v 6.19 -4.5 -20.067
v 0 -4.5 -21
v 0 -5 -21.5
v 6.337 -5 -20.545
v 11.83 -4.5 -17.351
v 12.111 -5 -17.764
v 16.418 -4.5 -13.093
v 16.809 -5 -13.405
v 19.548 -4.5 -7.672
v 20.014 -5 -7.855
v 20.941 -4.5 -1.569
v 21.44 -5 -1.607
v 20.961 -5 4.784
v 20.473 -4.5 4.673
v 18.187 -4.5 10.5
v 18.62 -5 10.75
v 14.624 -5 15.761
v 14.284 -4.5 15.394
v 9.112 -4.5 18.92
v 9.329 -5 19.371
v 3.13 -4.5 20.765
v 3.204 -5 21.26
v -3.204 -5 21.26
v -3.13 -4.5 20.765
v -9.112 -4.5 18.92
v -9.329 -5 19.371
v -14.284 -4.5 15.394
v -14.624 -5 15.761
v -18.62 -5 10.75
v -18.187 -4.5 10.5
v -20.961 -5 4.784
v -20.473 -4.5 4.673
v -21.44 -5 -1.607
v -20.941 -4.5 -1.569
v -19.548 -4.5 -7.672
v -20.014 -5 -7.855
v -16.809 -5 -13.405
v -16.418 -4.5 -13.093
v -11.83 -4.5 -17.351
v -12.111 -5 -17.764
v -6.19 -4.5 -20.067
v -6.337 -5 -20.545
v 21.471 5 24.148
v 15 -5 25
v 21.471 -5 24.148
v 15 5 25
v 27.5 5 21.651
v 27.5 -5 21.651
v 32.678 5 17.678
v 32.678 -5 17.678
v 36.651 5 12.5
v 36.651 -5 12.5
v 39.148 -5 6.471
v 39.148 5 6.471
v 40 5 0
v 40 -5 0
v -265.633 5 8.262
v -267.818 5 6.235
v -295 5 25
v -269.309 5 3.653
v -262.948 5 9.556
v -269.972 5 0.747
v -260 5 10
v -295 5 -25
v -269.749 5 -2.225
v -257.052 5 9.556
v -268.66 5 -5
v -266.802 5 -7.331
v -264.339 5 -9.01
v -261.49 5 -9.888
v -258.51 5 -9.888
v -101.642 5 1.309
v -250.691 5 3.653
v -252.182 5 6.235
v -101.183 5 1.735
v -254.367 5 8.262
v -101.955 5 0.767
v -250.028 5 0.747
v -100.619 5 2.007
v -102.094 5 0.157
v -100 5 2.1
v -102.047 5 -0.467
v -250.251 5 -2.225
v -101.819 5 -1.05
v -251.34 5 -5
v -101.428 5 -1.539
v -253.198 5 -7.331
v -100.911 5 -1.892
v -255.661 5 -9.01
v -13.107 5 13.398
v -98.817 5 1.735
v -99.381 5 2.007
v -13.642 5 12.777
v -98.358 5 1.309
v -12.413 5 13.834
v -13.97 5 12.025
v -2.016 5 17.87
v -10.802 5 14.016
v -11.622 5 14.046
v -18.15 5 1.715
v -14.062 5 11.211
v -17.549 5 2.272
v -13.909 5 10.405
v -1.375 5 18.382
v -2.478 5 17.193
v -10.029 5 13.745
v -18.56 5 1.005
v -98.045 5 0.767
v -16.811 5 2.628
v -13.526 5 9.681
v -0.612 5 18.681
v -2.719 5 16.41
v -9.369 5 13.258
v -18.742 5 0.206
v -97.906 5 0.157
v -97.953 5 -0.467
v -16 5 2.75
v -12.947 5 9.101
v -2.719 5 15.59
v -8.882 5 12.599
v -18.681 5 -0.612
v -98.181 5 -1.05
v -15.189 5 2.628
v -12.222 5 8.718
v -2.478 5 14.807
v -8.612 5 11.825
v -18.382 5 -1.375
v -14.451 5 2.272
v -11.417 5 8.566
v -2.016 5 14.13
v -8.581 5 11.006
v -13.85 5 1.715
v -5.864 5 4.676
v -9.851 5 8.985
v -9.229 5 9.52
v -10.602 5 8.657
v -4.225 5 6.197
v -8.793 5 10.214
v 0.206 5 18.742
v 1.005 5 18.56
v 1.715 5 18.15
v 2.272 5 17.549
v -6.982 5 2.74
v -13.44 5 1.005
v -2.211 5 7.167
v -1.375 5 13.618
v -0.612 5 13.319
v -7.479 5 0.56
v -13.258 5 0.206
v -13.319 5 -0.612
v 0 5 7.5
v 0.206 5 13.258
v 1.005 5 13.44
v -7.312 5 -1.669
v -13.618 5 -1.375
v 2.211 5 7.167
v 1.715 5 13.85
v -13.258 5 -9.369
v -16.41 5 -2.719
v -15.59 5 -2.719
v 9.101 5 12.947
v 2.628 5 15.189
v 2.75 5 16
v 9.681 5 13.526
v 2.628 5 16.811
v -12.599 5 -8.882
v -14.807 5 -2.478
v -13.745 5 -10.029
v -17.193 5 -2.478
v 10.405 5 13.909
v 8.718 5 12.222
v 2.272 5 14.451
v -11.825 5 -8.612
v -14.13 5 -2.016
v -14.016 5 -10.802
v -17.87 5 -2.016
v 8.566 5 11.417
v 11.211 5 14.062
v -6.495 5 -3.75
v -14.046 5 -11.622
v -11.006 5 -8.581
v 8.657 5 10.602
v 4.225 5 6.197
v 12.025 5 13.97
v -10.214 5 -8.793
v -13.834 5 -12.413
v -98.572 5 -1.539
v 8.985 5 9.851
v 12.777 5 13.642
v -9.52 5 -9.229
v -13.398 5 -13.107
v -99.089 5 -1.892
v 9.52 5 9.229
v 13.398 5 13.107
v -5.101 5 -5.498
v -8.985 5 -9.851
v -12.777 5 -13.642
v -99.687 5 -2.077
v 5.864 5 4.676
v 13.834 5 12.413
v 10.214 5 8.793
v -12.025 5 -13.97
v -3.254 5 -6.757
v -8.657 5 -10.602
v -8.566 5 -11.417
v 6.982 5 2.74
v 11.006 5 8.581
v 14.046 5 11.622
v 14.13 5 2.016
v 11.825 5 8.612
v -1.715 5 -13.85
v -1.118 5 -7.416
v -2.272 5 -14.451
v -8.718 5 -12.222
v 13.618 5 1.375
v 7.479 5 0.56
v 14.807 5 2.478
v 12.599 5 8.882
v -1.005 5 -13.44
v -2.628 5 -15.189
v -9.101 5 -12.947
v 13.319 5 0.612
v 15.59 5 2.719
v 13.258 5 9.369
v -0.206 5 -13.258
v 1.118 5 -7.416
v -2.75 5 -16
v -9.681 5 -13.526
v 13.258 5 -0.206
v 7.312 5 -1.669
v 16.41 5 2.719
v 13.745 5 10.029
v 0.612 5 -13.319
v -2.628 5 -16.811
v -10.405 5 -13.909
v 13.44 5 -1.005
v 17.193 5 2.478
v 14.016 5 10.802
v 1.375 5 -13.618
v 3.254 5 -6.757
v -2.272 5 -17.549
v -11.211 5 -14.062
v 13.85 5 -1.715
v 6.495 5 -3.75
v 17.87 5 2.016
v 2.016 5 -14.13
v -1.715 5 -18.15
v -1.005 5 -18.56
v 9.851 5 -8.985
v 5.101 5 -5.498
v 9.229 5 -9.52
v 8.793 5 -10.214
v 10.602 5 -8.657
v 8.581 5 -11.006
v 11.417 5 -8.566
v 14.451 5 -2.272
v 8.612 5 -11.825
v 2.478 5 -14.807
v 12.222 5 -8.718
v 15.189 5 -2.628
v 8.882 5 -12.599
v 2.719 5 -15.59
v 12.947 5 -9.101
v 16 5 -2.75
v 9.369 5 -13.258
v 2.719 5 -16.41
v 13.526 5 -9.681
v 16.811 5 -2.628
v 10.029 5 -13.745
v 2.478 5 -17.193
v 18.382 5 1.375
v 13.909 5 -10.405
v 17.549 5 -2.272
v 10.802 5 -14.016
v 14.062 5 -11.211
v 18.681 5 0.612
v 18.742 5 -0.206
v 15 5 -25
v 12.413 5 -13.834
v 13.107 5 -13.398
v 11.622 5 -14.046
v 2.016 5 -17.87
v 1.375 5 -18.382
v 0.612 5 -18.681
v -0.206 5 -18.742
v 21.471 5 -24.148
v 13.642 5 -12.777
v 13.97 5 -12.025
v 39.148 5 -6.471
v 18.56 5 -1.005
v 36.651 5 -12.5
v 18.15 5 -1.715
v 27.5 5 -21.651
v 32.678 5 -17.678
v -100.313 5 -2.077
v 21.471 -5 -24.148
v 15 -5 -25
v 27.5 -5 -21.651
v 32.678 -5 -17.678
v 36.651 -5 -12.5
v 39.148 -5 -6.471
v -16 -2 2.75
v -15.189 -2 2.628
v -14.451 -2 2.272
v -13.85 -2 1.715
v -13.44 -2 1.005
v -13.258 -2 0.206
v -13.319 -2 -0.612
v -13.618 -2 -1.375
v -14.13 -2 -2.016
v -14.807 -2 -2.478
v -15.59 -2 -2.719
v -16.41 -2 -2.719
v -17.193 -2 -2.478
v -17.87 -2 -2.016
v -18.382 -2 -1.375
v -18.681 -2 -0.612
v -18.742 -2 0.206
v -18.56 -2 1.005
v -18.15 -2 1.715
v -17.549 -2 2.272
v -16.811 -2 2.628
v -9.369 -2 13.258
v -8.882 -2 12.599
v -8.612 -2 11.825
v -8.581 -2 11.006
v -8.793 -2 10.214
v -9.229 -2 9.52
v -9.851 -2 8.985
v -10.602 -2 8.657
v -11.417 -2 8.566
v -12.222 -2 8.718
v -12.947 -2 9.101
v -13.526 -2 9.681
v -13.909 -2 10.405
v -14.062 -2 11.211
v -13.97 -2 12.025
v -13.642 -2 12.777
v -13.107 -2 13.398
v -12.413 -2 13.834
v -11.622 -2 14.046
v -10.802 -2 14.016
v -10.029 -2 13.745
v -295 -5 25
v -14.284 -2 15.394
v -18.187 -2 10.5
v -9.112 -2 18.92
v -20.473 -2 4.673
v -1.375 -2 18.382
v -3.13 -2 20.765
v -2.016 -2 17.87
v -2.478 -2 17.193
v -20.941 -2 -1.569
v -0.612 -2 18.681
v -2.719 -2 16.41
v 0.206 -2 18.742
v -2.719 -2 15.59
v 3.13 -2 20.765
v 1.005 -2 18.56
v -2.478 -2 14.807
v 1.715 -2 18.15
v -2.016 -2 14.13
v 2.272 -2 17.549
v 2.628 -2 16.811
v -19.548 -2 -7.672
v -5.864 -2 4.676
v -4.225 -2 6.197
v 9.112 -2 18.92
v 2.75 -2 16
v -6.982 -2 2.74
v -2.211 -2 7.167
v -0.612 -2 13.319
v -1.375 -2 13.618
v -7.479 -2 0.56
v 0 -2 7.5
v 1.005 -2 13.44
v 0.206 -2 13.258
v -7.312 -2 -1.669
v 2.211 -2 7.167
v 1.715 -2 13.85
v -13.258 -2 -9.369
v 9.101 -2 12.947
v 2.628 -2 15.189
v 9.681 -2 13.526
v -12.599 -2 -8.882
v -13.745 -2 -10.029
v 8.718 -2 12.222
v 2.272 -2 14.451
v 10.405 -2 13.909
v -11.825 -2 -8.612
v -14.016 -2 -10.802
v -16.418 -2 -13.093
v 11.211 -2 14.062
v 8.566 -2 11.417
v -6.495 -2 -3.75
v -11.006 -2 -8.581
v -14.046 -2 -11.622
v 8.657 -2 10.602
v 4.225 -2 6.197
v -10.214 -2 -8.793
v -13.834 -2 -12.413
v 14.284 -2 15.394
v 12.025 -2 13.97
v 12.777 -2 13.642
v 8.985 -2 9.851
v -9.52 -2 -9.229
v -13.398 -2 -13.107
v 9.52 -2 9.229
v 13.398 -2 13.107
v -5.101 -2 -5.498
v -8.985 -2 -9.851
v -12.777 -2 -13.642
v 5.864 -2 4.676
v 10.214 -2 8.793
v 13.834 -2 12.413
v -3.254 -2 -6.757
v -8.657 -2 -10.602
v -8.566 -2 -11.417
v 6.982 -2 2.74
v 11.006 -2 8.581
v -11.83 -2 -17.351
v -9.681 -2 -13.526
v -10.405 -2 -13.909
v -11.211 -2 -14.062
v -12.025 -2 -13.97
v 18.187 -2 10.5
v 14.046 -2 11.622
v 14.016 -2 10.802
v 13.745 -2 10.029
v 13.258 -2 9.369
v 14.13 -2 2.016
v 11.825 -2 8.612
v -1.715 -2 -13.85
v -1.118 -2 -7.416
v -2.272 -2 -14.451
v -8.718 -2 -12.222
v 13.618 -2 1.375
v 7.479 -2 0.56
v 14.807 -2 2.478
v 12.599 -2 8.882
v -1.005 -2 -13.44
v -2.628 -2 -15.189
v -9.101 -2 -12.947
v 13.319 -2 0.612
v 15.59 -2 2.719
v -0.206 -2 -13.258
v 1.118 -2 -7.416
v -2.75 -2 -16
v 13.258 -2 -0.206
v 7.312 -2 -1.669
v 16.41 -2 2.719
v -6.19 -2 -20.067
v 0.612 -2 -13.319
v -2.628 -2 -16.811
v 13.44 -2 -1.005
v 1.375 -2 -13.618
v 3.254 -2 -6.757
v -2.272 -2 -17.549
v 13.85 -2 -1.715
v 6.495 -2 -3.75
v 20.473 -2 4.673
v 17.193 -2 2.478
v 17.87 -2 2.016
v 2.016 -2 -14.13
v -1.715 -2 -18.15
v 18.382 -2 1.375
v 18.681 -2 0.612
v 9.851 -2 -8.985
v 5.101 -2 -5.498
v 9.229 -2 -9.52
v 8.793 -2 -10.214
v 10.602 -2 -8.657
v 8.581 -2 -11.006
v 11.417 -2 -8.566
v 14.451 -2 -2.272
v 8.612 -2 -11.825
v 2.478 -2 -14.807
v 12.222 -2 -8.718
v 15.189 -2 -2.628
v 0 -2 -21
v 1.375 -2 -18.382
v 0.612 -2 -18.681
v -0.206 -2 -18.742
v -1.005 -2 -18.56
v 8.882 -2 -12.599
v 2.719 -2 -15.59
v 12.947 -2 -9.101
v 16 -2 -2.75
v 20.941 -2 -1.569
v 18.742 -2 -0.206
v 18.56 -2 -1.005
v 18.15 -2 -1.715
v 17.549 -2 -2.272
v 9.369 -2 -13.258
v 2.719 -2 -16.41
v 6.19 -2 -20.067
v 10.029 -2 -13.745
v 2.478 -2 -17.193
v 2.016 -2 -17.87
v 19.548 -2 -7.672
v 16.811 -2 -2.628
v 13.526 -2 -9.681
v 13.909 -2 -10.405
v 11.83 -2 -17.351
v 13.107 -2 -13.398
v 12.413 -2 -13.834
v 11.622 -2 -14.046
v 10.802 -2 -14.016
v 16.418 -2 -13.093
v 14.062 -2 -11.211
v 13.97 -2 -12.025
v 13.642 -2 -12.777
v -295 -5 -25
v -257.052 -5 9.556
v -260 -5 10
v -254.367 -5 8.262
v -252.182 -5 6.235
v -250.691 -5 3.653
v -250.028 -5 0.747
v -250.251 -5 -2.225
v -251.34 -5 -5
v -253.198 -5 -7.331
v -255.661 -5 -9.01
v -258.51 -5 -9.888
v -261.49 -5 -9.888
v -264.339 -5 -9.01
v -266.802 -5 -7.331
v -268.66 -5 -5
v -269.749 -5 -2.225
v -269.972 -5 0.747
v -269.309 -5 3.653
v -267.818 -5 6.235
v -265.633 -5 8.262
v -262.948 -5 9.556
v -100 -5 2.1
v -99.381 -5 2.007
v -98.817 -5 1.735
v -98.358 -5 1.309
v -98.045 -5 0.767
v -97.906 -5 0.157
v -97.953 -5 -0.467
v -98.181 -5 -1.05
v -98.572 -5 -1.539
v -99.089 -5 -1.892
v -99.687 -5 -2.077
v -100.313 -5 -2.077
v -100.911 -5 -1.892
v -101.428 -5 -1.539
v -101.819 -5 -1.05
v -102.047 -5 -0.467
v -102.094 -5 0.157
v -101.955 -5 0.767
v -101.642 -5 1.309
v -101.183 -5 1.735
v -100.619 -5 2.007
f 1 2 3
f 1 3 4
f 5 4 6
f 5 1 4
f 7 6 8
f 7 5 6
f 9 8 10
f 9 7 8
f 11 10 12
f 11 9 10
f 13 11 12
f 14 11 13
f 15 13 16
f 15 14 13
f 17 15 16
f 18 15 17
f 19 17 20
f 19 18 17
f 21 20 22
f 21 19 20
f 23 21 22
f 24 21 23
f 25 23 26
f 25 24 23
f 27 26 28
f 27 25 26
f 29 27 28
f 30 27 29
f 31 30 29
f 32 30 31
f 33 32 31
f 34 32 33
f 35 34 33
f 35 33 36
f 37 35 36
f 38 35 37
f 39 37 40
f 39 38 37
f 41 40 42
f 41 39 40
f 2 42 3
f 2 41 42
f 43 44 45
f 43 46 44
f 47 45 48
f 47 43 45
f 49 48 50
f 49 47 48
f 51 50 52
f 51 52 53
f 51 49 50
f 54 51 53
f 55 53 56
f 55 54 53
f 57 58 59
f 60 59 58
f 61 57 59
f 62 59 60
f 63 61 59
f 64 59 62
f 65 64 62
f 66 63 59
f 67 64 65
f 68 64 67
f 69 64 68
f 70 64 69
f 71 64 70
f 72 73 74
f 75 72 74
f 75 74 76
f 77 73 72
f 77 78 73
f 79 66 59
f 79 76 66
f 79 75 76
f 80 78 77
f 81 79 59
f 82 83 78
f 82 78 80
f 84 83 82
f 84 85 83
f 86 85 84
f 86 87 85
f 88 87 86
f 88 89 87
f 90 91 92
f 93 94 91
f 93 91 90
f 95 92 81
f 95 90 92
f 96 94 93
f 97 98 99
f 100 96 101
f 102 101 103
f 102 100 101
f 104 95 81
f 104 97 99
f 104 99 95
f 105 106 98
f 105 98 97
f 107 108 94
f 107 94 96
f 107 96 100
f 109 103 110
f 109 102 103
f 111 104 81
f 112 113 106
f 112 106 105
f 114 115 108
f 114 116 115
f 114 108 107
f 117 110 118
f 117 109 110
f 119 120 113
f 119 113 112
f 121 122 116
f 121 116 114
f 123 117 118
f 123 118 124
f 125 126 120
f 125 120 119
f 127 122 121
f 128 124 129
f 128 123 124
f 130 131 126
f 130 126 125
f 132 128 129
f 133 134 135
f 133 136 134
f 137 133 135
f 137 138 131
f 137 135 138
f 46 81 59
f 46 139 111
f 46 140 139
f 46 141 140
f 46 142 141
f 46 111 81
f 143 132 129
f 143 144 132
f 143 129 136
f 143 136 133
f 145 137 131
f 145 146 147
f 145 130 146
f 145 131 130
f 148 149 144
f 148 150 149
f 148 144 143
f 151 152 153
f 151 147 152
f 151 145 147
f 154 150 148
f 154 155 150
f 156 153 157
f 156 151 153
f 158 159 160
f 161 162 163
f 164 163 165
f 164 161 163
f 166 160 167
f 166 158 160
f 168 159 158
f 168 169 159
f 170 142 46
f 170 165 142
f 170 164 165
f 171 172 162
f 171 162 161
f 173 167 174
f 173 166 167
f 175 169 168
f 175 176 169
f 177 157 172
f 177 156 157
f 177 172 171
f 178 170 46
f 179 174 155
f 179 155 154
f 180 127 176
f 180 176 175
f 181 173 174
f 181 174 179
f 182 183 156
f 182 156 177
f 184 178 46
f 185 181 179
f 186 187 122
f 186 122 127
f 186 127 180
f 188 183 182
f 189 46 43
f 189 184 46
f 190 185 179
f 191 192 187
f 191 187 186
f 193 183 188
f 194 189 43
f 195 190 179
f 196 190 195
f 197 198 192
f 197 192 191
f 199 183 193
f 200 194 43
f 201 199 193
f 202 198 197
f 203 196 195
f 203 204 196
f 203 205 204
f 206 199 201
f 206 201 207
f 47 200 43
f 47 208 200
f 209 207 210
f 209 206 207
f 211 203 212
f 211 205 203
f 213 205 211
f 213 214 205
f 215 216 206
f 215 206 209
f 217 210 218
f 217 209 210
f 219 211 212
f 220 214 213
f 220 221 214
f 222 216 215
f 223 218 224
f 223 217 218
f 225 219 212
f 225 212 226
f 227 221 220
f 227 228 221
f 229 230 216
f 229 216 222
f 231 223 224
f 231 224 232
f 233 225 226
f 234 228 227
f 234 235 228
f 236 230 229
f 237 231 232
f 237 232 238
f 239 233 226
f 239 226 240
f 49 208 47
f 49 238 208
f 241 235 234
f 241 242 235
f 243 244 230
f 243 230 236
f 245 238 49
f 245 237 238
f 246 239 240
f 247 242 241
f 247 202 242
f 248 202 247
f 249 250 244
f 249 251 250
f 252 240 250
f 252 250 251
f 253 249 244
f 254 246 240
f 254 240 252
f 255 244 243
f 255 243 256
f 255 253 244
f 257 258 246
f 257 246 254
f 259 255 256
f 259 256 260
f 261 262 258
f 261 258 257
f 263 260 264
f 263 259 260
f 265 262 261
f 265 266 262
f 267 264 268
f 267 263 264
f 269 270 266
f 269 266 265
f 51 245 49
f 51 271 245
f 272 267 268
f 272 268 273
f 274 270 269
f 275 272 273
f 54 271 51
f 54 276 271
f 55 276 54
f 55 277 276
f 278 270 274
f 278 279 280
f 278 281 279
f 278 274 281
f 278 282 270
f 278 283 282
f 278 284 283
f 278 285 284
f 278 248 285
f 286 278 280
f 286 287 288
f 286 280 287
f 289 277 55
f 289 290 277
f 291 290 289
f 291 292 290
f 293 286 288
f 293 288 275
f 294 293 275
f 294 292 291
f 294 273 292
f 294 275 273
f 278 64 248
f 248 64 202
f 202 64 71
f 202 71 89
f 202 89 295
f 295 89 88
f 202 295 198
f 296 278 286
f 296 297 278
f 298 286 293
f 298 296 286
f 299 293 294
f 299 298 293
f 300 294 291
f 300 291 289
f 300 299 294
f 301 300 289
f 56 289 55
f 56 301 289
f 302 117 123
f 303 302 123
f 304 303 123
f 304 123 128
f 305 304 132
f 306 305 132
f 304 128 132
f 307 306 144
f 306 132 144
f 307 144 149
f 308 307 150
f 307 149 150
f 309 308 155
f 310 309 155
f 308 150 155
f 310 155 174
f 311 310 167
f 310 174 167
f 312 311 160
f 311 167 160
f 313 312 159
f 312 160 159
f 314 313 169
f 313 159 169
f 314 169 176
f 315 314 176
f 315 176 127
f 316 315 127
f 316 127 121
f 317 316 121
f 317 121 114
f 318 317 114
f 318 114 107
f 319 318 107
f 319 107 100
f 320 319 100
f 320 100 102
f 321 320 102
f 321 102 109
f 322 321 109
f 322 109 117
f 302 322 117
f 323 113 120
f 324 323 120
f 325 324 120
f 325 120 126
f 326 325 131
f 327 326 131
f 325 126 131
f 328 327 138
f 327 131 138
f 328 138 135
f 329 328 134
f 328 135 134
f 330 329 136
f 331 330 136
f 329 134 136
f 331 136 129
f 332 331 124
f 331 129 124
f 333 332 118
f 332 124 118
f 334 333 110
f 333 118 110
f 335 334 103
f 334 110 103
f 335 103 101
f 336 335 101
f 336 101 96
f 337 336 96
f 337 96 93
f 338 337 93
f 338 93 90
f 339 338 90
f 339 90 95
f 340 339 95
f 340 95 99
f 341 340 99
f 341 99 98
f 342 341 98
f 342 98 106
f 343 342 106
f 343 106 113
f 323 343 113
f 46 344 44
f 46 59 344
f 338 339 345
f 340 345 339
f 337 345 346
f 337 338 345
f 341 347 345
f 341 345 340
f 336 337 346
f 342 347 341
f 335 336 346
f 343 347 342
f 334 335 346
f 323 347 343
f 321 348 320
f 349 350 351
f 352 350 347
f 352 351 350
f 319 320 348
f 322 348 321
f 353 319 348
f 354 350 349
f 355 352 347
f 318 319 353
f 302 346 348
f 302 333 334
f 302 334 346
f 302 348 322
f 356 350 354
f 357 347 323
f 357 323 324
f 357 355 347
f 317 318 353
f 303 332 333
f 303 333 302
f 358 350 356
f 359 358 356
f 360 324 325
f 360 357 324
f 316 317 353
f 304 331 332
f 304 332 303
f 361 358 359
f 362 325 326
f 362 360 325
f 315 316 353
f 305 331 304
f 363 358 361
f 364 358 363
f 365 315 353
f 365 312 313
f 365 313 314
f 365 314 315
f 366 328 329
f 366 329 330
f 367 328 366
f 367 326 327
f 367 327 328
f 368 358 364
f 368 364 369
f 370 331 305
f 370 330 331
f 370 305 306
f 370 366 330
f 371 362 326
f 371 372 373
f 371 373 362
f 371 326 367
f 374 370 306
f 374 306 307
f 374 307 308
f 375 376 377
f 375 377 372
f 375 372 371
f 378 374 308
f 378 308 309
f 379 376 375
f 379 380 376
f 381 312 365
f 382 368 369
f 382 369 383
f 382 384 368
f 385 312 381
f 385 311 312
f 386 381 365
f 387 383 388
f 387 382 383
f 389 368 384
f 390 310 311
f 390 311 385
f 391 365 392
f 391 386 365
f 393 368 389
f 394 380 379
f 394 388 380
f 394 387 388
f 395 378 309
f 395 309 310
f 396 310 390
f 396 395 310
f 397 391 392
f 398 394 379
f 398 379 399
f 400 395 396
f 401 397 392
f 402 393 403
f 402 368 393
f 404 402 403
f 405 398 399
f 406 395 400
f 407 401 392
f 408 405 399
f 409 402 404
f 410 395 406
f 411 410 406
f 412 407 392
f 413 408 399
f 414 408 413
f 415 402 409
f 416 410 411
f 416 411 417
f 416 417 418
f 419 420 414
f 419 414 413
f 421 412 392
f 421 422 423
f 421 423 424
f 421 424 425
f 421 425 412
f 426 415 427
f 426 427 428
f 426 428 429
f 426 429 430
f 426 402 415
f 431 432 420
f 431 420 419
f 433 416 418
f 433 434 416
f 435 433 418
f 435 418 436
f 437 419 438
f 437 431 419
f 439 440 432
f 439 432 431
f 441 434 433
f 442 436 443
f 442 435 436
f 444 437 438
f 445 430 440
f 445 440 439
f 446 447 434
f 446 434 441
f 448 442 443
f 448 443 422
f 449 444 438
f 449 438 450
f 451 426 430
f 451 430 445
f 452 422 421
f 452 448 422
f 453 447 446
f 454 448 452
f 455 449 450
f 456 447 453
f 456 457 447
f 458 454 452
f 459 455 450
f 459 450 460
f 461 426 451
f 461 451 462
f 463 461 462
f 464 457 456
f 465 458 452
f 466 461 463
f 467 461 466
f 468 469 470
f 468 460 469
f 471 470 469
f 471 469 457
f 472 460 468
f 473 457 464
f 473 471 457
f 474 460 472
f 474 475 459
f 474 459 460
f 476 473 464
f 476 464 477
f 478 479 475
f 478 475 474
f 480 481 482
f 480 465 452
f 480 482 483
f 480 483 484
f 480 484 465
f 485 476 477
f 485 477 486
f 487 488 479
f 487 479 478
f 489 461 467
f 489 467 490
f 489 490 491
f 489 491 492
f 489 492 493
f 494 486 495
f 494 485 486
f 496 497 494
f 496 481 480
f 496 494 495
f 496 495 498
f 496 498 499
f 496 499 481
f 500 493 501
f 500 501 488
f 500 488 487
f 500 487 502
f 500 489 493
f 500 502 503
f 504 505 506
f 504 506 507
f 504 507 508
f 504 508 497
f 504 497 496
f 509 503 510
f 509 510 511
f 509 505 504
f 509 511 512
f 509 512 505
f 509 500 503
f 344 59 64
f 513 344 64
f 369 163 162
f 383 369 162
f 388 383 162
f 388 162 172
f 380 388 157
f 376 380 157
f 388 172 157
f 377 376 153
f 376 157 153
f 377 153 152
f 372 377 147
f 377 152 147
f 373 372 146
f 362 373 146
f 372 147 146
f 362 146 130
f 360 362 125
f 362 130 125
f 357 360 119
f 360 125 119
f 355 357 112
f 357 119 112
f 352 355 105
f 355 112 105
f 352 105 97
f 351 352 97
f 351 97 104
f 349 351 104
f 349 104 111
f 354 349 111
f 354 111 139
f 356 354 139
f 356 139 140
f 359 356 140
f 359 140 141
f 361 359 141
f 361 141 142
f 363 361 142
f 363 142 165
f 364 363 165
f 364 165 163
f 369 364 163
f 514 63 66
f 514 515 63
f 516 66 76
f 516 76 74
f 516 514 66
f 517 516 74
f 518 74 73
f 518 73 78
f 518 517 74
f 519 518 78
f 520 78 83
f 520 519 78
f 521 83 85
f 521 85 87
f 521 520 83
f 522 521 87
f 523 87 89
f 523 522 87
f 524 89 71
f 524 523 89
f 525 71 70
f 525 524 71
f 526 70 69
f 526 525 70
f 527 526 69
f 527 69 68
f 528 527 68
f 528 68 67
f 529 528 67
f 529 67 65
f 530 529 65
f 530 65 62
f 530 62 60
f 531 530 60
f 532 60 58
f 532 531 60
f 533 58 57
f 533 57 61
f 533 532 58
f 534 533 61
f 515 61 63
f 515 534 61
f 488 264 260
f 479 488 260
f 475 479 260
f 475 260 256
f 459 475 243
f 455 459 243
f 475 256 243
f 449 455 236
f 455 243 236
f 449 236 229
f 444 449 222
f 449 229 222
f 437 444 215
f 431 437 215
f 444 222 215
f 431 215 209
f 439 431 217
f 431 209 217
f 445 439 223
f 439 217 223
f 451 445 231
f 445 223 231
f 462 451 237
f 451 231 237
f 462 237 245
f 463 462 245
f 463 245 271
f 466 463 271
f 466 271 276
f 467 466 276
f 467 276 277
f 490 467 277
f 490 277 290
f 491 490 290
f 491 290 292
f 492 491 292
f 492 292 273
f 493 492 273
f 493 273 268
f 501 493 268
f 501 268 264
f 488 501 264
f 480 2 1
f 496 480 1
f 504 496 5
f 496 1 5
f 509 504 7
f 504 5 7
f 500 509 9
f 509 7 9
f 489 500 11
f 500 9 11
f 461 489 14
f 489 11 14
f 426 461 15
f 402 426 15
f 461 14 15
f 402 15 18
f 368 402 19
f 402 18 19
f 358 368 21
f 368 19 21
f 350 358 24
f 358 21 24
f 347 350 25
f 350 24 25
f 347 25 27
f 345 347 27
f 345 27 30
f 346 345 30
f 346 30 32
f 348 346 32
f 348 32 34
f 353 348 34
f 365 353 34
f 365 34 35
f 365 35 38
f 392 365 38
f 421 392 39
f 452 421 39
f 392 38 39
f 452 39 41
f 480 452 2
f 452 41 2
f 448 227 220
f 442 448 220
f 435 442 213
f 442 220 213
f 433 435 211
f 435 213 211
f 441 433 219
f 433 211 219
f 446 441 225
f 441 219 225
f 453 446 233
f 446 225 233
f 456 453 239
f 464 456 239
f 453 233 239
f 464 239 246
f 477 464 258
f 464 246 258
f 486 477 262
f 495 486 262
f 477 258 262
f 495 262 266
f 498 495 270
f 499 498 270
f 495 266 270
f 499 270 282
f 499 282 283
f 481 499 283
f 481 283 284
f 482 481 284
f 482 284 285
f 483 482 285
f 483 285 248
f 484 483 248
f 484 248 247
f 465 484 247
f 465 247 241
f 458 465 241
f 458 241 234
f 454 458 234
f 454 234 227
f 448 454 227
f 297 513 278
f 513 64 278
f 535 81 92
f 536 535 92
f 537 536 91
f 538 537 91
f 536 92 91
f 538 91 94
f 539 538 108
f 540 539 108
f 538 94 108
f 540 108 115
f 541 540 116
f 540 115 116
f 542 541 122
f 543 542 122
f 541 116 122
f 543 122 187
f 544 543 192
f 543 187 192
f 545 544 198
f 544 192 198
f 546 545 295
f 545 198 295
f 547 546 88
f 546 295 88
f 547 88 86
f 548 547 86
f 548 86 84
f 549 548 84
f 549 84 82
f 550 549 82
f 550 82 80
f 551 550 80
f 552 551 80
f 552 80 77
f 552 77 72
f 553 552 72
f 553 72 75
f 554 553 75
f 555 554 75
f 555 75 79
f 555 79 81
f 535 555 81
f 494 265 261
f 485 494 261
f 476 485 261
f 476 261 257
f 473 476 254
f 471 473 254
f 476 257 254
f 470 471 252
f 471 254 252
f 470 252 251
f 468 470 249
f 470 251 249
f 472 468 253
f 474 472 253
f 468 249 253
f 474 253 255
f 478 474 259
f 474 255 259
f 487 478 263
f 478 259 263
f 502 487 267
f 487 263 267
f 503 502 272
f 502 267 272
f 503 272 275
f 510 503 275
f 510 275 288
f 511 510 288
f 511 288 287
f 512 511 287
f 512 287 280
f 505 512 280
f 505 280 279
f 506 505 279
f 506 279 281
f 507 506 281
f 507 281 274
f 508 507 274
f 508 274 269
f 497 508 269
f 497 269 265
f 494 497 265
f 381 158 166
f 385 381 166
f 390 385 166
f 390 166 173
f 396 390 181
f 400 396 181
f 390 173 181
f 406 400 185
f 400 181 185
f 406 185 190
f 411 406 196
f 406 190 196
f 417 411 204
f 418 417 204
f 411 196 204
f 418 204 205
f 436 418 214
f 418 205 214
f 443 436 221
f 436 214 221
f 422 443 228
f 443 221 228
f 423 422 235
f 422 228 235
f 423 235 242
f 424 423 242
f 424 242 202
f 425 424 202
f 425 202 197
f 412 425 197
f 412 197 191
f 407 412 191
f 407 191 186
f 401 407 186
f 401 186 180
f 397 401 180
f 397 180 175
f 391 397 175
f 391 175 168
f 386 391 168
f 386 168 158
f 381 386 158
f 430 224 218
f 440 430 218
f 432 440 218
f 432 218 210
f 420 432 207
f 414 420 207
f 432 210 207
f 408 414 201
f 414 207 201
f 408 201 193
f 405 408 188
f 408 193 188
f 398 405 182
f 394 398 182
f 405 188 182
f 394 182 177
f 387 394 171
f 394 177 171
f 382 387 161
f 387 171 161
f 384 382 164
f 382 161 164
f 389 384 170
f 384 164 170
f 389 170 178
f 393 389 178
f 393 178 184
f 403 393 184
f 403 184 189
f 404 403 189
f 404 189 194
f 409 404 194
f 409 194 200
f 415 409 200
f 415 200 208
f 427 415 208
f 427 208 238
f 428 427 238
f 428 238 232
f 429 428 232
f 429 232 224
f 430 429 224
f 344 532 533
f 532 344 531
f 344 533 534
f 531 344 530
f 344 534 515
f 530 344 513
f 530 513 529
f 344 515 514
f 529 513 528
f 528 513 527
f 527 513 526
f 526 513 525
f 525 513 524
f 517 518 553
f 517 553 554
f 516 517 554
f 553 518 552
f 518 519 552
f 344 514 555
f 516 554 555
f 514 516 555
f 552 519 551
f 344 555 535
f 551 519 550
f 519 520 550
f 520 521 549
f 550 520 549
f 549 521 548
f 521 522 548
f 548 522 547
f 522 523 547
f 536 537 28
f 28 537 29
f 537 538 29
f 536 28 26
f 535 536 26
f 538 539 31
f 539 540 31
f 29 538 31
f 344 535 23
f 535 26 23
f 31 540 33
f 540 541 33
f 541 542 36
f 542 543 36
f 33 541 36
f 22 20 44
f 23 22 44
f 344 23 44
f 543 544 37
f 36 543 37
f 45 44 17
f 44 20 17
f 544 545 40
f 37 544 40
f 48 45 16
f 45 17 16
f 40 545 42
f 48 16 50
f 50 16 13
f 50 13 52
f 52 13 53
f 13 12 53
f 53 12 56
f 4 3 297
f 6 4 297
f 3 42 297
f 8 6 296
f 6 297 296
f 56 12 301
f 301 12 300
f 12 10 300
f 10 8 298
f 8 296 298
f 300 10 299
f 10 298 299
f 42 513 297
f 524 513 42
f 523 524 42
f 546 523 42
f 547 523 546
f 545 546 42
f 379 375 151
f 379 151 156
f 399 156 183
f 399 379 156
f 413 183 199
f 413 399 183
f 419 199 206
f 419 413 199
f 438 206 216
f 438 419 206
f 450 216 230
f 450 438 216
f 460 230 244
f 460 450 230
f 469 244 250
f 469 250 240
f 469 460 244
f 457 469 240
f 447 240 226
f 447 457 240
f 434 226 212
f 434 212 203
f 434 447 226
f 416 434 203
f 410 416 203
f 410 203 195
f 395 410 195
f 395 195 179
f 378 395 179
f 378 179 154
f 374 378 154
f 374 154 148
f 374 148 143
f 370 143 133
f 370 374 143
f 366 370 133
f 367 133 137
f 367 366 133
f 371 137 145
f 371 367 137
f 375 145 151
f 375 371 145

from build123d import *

# Parameters (mm, degrees)
SCHIZZO1_W                   = 335
SCHIZZO1_H                   = 50
SCHIZZO1_R                   = 7.5
SCHIZZO1_R_2                 = 10
ESTRUSIONE_ESTRUSIONE1_DEPTH = 5
SCHIZZO2_R                   = 2.75
TAGLIO_ESTRUSIONE1_DEPTH     = 297.226264872
RIPETIZIONECIRCOLARE1_COUNT  = 8
RACCORDO1_R                  = 25
SCHIZZO3_R                   = 2.1
TAGLIO_ESTRUSIONE2_DEPTH     = 297.226264872
SCHIZZO4_R                   = 21
TAGLIO_ESTRUSIONE3_DEPTH     = 3
SMUSSO1_SIZE                 = 0.5


with BuildPart() as part:
    # Schizzo1 → Estrusione-Estrusione1 (new, symmetric)
    with BuildSketch(Plane(origin=(0, 0, 0), x_dir=(1, 0, 0), z_dir=(0, 1, 0))):
        with Locations((-127.5, 0)):
            Rectangle(SCHIZZO1_W, SCHIZZO1_H)
        with Locations(Location((0, 0, 0), (0, 0, 270))):
            Circle(SCHIZZO1_R, mode=Mode.SUBTRACT)
        with Locations(Location((-260, 0, 0), (0, 0, 270))):
            Circle(SCHIZZO1_R_2, mode=Mode.SUBTRACT)
    extrude(amount=ESTRUSIONE_ESTRUSIONE1_DEPTH, both=True)

    # Schizzo2 → Taglio-Estrusione1 (cut, through all)
    with BuildSketch(Plane(origin=(0, 5, 0), x_dir=(1, 0, 0), z_dir=(0, 1, 0))):
        with Locations(Location((-16, 0, 0), (0, 0, 270))):
            Circle(SCHIZZO2_R)
    taglio_estrusione1 = extrude(amount=-TAGLIO_ESTRUSIONE1_DEPTH, mode=Mode.SUBTRACT)

    # RipetizioneCircolare1: Taglio-Estrusione1 ×8 about axis
    ripetizionecircolare1_axis = Axis((0, 0, 0), (0, 1, 0))
    for i in range(1, RIPETIZIONECIRCOLARE1_COUNT):
        add(taglio_estrusione1.rotate(ripetizionecircolare1_axis, i * 360 / RIPETIZIONECIRCOLARE1_COUNT), mode=Mode.SUBTRACT)

    # Raccordo1
    raccordo1_edges = [part.edges().sort_by_distance(p)[0] for p in [
        (40, 0, 25),
        (40, 0, -25),
    ]]
    fillet(raccordo1_edges, radius=RACCORDO1_R - 0.0001)  # a hair under: the kernel refuses the full size

    # Schizzo3 → Taglio-Estrusione2 (cut, through all)
    with BuildSketch(Plane(origin=(0, 5, 0), x_dir=(1, 0, 0), z_dir=(0, 1, 0))):
        with Locations(Location((-100, 0, 0), (0, 0, 270))):
            Circle(SCHIZZO3_R)
    extrude(amount=-TAGLIO_ESTRUSIONE2_DEPTH, mode=Mode.SUBTRACT)

    # Schizzo4 → Taglio-Estrusione3 (cut)
    with BuildSketch(Plane.XZ.offset(5)):
        with Locations(Location((0, 0, 0), (0, 0, 270))):
            Circle(SCHIZZO4_R)
    extrude(amount=-TAGLIO_ESTRUSIONE3_DEPTH, mode=Mode.SUBTRACT)

    # Smusso1
    smusso1_edges = [part.edges().sort_by_distance(p)[0] for p in [
        (0, -5, 21),
    ]]
    chamfer(smusso1_edges, length=SMUSSO1_SIZE)


solid = part.part
